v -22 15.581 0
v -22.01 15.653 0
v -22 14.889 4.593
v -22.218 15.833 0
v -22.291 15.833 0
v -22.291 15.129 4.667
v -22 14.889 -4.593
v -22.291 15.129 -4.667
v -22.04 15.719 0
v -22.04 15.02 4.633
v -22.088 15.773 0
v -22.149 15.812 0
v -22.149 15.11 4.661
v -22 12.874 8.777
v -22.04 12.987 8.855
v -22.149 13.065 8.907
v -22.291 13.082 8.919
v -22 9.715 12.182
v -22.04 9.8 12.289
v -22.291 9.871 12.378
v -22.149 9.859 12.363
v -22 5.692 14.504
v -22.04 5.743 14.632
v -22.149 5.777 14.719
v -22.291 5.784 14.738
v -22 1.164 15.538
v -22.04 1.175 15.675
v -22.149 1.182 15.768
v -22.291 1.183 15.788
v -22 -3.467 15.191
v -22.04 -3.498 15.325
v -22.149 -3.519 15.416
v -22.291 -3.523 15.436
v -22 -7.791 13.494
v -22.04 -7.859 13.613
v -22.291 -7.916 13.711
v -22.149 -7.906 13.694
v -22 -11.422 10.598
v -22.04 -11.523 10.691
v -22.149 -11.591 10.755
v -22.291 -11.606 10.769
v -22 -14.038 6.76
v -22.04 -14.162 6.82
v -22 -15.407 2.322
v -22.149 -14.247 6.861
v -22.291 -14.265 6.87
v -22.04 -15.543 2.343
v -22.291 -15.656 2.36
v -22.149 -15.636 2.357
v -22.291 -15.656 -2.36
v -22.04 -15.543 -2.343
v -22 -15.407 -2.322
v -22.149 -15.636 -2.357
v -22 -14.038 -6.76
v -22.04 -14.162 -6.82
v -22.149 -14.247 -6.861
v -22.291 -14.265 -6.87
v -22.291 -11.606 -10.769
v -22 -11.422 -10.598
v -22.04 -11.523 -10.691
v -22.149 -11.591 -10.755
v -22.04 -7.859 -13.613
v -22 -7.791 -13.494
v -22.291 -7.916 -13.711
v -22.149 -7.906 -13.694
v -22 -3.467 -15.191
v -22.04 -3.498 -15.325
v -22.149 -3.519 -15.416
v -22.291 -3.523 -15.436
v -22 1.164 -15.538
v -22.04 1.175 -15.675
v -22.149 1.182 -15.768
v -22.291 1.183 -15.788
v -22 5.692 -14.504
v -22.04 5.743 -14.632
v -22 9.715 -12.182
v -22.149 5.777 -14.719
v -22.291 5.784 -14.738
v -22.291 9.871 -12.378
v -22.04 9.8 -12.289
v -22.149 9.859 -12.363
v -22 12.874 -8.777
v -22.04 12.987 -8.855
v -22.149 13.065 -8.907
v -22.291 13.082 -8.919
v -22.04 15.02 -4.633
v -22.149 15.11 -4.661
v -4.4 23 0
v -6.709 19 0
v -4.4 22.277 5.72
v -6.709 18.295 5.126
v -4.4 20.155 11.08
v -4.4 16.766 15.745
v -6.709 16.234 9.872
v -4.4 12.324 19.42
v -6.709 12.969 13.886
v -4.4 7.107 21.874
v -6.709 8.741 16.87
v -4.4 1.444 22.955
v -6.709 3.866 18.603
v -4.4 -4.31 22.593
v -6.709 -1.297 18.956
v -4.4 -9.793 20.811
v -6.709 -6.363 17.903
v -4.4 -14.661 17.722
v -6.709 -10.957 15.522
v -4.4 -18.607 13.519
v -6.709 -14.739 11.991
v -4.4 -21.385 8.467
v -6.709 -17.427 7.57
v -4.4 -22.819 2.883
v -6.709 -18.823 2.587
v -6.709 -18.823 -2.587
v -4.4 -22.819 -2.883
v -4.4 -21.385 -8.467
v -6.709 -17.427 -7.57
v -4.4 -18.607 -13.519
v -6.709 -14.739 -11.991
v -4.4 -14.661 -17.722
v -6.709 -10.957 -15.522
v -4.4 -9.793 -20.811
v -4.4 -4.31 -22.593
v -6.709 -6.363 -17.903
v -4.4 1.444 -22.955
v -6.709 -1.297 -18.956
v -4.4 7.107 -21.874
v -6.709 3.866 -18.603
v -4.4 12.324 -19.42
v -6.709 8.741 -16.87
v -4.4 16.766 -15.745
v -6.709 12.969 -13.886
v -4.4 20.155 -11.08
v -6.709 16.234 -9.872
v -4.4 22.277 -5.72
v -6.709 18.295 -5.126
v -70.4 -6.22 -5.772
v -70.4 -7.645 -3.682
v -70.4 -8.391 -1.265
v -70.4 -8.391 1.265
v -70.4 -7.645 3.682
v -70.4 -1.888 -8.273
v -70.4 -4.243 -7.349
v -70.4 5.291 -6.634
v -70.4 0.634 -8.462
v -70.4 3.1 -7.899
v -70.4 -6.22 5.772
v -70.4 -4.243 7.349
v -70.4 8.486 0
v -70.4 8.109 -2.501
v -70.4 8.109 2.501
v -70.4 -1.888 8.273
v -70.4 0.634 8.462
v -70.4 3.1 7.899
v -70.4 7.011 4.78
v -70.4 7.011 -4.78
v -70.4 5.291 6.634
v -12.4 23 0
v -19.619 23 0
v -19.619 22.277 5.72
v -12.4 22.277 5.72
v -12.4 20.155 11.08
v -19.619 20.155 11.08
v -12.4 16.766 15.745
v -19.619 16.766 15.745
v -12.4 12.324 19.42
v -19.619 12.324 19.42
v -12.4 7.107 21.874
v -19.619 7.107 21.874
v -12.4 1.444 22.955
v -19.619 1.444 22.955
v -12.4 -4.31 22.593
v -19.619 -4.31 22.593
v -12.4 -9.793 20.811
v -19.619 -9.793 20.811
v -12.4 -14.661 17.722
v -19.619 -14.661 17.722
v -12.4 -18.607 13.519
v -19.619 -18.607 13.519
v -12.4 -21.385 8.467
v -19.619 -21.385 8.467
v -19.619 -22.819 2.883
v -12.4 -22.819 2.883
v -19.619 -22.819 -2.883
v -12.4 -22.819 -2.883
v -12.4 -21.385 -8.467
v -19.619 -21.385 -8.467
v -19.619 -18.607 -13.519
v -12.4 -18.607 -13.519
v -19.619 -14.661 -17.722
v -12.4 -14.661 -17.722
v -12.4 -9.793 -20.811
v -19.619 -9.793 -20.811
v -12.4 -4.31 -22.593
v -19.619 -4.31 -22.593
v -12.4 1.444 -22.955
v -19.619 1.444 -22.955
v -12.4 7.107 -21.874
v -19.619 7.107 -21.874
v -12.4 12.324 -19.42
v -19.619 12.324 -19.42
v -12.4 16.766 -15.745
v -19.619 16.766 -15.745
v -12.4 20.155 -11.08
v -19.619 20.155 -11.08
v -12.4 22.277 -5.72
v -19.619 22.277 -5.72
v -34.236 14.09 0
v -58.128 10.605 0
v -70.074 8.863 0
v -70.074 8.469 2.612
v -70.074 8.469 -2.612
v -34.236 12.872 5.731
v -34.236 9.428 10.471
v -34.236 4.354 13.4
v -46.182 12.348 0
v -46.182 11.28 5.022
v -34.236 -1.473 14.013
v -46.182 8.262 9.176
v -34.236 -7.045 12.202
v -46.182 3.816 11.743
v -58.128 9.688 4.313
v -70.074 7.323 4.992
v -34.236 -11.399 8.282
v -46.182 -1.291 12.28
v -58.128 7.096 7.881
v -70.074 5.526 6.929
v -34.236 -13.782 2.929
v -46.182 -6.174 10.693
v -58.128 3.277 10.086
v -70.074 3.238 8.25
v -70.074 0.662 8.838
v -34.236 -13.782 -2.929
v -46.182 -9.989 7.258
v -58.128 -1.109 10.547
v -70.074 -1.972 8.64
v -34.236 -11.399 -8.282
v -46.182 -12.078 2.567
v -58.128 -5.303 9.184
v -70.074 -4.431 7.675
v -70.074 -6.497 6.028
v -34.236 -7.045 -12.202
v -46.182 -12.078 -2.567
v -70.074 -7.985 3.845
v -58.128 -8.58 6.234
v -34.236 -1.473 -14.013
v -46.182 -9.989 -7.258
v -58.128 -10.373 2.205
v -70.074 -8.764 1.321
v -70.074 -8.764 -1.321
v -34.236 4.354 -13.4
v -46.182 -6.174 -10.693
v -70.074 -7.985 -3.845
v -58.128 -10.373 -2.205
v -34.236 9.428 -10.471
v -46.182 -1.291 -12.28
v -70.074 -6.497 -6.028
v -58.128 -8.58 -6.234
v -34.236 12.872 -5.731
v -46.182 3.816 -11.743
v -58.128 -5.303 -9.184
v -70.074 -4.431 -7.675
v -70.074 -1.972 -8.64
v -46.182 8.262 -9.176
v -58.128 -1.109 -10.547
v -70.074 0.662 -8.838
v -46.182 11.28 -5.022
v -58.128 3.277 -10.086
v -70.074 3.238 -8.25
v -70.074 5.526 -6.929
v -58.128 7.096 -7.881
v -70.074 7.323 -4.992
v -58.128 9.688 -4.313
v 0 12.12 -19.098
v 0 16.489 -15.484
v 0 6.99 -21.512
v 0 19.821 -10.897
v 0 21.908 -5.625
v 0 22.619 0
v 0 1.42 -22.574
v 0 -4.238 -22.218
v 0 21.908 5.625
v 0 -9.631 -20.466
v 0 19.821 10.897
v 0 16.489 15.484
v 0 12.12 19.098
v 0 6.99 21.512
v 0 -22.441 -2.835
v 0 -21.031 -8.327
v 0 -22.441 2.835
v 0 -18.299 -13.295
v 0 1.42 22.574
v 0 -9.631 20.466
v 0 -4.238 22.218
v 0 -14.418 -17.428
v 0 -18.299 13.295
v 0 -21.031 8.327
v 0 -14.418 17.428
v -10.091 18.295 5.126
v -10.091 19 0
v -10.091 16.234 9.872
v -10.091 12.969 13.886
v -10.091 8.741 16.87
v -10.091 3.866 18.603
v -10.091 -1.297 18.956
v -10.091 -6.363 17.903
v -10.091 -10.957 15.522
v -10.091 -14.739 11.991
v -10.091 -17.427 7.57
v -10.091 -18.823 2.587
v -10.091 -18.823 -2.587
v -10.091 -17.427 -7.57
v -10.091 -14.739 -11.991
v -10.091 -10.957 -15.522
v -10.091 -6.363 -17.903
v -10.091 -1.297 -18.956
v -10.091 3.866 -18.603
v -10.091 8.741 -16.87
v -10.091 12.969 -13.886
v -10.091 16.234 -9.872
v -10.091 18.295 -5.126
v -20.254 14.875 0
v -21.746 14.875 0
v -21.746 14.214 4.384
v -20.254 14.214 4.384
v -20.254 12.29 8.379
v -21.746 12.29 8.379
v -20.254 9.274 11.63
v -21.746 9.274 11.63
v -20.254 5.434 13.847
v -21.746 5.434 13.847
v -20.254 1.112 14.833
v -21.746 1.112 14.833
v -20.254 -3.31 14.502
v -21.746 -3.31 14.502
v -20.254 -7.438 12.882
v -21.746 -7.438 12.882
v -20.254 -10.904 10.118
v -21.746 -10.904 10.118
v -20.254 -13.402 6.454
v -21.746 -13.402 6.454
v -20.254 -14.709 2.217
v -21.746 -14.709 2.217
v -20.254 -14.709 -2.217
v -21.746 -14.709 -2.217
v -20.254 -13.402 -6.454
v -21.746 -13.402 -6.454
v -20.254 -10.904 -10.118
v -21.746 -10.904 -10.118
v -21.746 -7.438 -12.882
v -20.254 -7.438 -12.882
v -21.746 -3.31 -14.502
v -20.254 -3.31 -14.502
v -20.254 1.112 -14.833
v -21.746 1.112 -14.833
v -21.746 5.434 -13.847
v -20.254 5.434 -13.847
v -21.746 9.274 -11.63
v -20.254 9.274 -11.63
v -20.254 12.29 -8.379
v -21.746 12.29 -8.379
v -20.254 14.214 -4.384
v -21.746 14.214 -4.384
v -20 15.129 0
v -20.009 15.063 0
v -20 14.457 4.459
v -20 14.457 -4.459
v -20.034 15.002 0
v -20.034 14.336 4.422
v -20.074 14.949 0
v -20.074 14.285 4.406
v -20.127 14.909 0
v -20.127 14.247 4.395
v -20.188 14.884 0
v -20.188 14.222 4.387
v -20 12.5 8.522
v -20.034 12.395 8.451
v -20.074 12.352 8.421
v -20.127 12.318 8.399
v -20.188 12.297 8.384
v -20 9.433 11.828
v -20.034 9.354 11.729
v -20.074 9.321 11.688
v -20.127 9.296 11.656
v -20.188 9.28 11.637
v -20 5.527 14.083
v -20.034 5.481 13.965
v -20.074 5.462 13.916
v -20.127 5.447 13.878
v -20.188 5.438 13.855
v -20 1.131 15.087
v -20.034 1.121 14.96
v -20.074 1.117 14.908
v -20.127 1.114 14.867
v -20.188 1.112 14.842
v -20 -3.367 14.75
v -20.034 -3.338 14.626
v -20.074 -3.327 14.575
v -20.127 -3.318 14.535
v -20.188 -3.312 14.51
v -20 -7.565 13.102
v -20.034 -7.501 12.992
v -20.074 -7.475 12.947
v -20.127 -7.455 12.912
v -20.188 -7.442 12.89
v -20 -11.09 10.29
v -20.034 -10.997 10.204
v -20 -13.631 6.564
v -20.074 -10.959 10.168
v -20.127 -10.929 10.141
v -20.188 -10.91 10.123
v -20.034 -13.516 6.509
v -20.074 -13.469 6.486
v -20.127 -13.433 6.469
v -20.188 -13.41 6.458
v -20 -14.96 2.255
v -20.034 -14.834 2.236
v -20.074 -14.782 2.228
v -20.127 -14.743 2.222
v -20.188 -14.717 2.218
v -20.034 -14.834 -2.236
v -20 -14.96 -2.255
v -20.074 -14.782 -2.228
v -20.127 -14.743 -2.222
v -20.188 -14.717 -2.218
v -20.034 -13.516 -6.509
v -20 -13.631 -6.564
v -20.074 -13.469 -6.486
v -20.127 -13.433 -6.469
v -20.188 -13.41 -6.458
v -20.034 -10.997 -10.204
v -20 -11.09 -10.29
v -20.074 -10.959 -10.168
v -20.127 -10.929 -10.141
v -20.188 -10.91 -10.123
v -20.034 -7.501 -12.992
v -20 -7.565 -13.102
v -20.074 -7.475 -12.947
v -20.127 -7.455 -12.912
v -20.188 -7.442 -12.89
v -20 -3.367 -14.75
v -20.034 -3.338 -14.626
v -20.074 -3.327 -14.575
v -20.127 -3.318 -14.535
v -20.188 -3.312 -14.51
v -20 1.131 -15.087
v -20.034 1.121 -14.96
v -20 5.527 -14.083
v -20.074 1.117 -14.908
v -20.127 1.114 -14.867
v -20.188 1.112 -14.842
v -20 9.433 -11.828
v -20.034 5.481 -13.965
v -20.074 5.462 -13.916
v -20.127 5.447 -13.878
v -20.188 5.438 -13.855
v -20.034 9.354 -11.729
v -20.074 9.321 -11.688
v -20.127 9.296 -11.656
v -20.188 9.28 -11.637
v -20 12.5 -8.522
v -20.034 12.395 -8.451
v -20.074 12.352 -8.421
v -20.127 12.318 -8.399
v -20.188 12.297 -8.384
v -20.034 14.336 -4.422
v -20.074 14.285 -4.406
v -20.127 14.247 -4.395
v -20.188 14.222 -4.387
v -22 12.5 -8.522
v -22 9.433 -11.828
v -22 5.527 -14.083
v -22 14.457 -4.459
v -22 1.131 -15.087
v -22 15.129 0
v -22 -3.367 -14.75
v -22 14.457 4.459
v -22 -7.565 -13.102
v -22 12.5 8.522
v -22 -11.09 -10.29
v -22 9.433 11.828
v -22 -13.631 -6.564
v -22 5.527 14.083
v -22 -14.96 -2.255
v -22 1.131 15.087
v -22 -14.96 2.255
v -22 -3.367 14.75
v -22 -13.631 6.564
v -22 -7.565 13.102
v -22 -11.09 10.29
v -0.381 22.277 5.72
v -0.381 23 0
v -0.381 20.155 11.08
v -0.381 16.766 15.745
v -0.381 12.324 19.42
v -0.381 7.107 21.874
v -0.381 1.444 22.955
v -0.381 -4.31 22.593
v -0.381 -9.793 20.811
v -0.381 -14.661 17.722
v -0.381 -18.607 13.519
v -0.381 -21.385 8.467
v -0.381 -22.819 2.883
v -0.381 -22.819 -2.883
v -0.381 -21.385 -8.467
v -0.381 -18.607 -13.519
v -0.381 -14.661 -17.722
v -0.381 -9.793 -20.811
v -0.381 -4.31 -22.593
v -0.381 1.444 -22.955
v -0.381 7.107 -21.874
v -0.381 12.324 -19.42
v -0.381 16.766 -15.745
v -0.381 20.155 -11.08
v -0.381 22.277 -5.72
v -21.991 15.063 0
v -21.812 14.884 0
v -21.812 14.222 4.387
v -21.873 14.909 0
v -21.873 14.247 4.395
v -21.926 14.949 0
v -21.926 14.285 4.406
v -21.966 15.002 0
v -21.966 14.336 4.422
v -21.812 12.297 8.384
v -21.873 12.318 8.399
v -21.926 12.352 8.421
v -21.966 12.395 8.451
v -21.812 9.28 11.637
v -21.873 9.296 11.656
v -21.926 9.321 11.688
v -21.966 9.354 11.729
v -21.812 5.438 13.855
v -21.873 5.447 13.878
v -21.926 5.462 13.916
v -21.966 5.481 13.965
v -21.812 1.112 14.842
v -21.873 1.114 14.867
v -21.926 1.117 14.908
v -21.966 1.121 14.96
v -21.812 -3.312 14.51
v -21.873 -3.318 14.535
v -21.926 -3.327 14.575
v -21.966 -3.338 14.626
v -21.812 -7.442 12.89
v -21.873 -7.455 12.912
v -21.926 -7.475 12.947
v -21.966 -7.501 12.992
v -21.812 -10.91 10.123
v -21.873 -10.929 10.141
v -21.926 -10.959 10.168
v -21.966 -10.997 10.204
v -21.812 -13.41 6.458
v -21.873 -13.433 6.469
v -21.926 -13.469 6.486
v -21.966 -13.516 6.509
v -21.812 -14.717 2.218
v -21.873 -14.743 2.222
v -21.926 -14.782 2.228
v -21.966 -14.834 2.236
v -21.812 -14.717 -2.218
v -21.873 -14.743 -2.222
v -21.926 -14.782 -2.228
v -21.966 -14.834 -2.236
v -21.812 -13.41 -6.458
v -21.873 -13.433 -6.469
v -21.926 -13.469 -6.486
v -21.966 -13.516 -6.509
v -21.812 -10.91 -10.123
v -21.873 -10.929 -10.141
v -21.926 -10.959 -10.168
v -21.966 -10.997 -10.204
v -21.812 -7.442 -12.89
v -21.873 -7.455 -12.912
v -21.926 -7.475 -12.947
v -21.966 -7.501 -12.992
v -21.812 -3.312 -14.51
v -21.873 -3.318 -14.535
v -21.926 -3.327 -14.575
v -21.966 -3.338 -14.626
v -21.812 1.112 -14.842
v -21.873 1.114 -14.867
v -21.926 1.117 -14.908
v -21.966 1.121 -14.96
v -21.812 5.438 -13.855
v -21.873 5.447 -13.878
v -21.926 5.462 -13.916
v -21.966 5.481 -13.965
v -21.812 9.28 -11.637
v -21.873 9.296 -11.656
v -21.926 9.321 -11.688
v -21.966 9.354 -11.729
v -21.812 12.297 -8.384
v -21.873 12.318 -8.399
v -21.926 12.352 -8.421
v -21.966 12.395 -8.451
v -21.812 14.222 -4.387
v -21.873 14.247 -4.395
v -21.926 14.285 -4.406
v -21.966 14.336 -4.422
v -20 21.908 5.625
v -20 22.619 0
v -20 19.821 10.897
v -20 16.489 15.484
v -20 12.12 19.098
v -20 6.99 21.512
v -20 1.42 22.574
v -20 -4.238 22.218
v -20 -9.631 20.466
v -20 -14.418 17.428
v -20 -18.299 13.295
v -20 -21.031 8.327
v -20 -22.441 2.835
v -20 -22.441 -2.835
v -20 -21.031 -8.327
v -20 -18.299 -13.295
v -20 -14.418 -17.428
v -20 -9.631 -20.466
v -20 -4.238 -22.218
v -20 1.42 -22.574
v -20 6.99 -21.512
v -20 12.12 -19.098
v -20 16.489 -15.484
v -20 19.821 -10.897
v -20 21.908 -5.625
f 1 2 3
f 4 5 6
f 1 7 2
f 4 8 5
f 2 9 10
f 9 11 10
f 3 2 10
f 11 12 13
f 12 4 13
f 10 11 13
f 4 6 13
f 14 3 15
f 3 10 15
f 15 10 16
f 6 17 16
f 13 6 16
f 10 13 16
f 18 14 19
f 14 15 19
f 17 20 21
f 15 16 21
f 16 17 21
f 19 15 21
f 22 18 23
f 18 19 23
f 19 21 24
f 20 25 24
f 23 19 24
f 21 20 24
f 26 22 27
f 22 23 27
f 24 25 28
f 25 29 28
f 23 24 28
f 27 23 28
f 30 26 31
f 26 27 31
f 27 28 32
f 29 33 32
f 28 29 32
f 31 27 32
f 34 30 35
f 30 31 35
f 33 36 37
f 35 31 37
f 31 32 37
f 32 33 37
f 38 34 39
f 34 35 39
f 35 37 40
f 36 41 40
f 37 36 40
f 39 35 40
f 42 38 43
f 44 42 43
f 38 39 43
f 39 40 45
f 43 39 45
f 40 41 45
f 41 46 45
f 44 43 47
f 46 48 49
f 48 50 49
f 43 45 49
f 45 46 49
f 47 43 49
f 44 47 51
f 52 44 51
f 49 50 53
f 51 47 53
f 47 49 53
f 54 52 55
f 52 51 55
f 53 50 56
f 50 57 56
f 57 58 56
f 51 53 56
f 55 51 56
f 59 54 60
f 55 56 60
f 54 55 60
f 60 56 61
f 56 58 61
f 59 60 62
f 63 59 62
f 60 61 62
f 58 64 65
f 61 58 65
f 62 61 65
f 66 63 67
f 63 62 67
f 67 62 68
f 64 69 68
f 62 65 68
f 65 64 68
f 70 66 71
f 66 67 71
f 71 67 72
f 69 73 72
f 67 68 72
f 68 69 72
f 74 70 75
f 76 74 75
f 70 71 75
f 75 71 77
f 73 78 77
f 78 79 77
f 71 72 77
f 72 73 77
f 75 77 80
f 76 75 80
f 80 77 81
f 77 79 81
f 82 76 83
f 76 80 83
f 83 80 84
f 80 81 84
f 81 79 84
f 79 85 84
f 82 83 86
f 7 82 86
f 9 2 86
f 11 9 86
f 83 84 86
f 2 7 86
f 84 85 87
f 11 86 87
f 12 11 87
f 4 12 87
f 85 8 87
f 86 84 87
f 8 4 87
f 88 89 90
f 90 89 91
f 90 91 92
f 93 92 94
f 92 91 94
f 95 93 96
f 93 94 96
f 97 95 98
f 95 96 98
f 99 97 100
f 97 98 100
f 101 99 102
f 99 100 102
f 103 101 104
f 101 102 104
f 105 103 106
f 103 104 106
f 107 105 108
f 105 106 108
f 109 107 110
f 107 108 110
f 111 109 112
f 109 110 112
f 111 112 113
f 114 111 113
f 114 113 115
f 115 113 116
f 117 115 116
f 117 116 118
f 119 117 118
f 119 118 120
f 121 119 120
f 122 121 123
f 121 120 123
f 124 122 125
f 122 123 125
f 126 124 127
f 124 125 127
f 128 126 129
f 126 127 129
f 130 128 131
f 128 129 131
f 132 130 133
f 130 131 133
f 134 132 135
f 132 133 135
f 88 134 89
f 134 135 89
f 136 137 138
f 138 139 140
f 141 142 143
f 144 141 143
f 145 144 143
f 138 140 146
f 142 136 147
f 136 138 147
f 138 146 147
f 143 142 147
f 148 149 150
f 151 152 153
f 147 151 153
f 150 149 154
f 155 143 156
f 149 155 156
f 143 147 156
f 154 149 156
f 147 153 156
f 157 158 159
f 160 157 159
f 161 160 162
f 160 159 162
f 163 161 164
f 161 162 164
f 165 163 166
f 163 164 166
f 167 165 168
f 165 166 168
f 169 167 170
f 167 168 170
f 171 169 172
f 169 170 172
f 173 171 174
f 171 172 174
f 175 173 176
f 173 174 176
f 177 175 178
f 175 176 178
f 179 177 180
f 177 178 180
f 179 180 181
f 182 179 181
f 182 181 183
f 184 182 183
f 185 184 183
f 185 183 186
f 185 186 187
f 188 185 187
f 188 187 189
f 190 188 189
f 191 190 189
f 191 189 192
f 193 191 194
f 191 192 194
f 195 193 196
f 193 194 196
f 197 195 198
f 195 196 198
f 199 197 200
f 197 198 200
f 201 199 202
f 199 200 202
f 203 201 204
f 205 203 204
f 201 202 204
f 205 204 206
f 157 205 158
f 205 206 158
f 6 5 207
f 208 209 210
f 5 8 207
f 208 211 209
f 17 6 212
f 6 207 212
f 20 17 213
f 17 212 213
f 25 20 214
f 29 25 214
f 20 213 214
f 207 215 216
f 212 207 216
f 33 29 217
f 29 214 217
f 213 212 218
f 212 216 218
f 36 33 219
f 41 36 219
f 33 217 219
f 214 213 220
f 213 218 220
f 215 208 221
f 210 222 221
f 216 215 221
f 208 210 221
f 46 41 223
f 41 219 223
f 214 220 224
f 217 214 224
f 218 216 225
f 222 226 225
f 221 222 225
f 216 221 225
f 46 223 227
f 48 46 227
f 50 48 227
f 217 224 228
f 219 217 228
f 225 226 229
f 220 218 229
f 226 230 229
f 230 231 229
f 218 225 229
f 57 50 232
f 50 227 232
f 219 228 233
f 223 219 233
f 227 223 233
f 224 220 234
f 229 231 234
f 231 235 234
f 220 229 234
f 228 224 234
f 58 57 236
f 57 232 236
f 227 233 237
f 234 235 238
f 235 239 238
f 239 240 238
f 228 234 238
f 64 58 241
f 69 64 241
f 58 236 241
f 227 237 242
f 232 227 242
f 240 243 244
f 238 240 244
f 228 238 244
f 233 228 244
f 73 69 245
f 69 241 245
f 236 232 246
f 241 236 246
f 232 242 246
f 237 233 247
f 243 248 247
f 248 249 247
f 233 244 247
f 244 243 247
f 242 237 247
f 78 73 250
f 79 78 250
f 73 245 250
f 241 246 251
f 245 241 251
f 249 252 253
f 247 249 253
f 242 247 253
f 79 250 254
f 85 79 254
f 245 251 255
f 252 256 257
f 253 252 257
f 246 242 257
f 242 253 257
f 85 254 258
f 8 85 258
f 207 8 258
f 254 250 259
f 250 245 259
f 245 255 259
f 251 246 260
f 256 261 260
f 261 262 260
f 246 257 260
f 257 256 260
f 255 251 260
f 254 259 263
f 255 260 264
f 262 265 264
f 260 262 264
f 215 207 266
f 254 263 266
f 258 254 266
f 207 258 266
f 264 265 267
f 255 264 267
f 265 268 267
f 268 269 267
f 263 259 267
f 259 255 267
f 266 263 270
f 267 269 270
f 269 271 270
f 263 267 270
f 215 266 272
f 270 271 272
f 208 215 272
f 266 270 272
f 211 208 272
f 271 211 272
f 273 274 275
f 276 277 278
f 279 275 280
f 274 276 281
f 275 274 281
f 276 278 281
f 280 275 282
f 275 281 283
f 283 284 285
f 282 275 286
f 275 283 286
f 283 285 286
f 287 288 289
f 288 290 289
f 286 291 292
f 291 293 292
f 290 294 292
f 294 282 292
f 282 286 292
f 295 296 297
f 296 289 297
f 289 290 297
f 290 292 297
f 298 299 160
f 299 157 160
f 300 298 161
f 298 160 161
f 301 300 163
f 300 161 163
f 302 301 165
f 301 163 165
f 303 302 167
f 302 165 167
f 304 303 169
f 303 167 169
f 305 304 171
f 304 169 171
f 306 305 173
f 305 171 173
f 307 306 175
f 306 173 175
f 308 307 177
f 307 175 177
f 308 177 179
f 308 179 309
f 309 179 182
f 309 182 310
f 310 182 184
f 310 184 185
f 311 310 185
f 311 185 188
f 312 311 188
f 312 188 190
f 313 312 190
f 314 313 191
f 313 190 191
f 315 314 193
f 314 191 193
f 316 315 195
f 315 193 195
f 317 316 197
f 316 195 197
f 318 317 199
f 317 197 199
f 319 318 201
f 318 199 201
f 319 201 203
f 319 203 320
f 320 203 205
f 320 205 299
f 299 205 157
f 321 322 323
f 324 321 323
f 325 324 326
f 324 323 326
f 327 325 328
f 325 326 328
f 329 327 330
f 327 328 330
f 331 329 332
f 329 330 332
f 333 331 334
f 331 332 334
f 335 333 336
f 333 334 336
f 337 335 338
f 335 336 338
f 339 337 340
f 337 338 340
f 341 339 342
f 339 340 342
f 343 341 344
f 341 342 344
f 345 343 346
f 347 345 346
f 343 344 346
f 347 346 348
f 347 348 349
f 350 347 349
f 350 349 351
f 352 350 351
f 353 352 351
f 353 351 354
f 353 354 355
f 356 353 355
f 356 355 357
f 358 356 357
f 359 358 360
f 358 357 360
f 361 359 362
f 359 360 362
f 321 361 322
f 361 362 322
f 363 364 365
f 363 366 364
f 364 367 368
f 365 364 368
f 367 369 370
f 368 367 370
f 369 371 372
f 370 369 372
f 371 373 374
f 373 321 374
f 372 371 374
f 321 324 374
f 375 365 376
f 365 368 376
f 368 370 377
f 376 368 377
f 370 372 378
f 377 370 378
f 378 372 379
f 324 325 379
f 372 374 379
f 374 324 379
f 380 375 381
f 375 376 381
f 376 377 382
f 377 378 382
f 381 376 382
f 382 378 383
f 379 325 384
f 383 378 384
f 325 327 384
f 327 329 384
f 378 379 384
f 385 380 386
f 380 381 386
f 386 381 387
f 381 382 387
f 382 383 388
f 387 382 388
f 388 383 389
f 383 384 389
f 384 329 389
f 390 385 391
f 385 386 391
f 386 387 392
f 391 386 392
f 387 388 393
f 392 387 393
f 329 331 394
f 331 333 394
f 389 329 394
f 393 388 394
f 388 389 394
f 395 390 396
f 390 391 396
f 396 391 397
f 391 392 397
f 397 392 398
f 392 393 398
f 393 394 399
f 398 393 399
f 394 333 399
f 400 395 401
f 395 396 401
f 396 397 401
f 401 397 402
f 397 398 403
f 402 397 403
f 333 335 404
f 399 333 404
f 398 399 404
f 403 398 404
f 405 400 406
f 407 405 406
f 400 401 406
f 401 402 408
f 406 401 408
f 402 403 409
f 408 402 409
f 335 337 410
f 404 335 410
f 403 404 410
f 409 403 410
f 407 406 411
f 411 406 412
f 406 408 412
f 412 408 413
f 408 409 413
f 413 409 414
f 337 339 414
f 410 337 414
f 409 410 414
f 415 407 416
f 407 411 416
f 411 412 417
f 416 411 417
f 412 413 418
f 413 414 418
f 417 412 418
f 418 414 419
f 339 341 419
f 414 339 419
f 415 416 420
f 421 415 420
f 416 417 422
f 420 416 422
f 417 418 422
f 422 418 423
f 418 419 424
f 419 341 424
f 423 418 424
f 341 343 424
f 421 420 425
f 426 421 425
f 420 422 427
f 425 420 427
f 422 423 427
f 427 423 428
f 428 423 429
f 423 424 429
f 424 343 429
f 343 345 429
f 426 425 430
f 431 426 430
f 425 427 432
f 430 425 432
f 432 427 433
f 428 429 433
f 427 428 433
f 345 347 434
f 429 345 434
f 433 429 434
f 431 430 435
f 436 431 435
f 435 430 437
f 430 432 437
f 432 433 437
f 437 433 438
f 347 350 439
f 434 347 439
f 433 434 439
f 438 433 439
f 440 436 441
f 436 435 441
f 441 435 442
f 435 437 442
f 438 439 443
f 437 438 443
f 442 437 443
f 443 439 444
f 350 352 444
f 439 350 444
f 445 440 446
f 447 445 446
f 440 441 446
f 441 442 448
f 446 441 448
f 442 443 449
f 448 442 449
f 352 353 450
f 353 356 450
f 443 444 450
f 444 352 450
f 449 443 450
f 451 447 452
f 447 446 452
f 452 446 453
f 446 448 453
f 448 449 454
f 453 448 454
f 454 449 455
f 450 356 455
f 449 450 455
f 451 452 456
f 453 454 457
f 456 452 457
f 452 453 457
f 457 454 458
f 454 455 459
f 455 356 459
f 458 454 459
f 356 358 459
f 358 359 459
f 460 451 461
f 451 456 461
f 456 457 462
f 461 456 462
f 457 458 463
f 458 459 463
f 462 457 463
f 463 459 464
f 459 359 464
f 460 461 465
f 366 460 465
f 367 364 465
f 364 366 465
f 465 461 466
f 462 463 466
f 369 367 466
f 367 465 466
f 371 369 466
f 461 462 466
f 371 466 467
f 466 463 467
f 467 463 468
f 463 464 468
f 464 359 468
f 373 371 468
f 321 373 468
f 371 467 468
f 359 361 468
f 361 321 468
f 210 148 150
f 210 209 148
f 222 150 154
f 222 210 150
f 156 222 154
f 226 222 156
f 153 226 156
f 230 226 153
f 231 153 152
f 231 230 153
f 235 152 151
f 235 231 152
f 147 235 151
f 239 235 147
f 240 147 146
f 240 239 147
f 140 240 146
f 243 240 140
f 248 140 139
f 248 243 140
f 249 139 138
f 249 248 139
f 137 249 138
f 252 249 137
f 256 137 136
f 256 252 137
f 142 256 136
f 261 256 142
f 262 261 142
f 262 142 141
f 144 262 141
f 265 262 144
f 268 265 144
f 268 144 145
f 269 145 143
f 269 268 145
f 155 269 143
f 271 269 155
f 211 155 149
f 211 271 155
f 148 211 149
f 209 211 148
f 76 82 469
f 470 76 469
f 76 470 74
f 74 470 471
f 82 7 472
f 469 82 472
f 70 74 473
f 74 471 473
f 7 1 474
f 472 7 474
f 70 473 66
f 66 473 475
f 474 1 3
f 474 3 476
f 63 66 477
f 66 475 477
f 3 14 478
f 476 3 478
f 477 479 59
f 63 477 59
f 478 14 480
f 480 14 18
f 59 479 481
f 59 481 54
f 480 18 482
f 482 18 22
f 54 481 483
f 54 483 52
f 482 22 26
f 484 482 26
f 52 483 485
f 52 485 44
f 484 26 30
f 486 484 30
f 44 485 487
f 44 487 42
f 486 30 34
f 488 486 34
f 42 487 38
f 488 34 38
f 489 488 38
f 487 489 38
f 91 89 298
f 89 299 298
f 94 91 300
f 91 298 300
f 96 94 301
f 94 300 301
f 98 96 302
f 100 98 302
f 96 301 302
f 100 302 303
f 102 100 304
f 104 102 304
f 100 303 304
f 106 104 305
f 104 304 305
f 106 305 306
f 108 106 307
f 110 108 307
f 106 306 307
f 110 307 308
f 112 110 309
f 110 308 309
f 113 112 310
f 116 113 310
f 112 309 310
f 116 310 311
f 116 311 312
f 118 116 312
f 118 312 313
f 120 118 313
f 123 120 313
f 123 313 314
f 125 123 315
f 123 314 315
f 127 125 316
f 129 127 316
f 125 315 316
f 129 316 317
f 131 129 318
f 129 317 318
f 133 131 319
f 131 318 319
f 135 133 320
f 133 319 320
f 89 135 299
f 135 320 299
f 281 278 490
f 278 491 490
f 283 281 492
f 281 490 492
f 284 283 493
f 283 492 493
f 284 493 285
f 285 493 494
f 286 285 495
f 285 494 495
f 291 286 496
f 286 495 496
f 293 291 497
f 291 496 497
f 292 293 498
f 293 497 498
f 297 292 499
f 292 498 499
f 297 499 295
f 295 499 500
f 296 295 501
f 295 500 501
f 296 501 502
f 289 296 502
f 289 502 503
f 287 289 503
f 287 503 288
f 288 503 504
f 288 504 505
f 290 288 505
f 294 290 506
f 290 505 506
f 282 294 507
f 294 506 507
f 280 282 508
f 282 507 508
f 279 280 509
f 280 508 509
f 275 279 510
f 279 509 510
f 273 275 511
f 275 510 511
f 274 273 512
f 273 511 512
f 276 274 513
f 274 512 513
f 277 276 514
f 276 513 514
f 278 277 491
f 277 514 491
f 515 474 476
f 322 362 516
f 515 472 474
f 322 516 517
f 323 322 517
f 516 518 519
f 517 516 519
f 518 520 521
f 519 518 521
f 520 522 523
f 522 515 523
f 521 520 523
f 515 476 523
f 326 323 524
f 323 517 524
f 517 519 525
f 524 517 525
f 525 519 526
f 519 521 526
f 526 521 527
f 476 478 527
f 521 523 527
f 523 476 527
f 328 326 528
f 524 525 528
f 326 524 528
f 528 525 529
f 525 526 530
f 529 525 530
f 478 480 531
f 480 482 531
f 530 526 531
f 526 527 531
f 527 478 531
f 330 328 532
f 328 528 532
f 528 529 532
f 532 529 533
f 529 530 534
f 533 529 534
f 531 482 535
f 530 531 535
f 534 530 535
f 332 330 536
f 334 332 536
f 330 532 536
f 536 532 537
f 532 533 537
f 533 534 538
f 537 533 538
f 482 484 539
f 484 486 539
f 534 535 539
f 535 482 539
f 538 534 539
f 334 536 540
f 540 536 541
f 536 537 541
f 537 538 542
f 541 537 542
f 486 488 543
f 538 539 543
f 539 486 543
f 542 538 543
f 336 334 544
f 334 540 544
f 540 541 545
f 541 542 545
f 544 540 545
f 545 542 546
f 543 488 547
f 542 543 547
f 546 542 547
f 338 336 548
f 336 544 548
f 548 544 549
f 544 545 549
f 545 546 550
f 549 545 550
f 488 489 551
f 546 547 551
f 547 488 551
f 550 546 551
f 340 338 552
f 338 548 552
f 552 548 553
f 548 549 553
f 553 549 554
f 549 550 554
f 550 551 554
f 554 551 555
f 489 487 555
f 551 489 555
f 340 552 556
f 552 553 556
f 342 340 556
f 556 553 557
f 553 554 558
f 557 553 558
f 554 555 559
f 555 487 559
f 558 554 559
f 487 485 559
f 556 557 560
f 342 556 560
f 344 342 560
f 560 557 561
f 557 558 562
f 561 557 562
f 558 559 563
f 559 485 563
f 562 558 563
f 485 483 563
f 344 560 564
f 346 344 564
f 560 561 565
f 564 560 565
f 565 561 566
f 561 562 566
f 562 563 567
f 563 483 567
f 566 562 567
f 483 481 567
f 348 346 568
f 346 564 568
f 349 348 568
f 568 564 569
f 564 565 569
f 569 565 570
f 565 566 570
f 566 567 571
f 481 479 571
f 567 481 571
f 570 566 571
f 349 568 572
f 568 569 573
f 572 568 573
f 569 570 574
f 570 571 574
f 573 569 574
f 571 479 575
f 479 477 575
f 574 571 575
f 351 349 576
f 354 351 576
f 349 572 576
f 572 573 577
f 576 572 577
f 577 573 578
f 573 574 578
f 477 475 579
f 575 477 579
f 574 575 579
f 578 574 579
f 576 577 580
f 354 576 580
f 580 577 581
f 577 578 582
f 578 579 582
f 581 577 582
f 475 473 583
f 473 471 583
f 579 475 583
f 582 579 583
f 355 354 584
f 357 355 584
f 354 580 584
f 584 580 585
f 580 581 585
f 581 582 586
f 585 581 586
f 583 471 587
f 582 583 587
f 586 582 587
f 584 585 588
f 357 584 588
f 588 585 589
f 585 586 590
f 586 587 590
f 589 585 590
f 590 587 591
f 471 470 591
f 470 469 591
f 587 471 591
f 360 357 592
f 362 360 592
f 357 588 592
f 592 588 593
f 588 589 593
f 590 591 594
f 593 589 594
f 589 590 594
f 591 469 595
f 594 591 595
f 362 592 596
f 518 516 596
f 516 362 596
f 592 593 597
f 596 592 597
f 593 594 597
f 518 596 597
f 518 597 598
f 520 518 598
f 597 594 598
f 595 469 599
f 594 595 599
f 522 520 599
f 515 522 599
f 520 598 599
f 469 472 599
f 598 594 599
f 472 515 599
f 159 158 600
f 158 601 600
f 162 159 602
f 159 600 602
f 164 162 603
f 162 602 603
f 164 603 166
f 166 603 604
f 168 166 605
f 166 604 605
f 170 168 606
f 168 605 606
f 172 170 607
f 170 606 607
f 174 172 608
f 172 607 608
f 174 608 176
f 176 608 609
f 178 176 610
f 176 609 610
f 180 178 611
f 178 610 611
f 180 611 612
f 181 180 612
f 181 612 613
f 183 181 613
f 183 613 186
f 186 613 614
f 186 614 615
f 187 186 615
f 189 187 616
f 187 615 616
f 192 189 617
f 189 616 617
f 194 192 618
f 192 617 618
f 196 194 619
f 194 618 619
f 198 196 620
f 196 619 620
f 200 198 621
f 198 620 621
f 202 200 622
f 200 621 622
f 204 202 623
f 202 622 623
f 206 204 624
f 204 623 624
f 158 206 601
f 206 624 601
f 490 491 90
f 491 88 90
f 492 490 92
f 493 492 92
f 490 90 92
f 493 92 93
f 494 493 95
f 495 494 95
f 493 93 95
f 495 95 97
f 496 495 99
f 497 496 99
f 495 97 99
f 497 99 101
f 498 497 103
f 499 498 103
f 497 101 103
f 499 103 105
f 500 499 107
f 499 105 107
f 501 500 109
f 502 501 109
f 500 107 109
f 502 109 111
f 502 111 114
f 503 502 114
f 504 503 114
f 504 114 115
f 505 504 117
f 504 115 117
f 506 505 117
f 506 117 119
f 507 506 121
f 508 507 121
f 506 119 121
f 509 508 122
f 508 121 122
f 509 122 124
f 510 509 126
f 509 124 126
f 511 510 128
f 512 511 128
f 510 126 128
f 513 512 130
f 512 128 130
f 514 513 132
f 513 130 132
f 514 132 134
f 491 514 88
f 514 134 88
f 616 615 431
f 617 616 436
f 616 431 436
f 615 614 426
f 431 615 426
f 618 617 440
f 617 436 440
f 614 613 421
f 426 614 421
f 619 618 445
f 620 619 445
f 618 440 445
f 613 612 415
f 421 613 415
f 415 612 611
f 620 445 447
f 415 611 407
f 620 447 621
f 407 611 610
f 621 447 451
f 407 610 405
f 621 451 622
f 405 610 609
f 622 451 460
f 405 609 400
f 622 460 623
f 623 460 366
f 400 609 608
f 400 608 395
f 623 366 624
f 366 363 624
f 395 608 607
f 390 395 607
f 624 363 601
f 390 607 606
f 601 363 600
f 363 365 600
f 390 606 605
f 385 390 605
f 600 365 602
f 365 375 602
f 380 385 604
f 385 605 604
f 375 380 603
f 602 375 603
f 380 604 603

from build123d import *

# Parameters (mm, degrees)
F3_R = 0.254


# Not quite as in the source:
# - a fillet or chamfer that OpenCascade refuses, or shapes differently, is made with other operations: its cross-section is extruded or revolved along the edge and cut away or added


with BuildPart() as f1:
    # F0 (on Top) → F1 (revolve)
    with BuildSketch(Plane.XY):
        Polygon((-70.4, 0), (0, 0), (0, 23), (-4.4, 23), (-6.7094010768, 19), (-10.0905989232, 19), (-12.4, 23), (-20, 23), (-20, 14.875), (-22, 14.875), (-22, 15.875), (-70.4, 8.815), align=None)
    revolve(axis=Axis((-35.2, 0, 0), (1, 0, 0)))

    # F2: chamfer of 0.381 on 3 edges, made by hand

    # F2_s1 → F2_t2 (revolve, cut)
    with BuildSketch(Plane.XY):
        Polygon((0, 22.619), (-0.381, 23), (0, 23), align=None)
    revolve(axis=Axis((0, 0, 0), (1, 0, 0)), mode=Mode.SUBTRACT)

    # F2_s3 → F2_t4 (revolve, cut)
    with BuildSketch(Plane.XY):
        Polygon((-19.619, 23), (-20, 22.619), (-20, 23), align=None)
    revolve(axis=Axis((-20, 0, 0), (1, 0, 0)), mode=Mode.SUBTRACT)

    # F2_s5 → F2_t6 (revolve, cut)
    with BuildSketch(Plane.XY):
        Polygon((-70.4, 8.4855436088), (-70.0739936383, 8.8625538205), (-70.4, 8.815), align=None)
    revolve(axis=Axis((-70.4, 0, 0), (1, 0, 0)), mode=Mode.SUBTRACT)

    # F3
    f3_edges = [f1.edges().sort_by_distance(p)[0] for p in [
        (-22, -15.875, 0),
        (-22, -14.875, 0),
        (-20, -14.875, 0),
    ]]
    fillet(f3_edges, radius=F3_R)


solid = f1.part
